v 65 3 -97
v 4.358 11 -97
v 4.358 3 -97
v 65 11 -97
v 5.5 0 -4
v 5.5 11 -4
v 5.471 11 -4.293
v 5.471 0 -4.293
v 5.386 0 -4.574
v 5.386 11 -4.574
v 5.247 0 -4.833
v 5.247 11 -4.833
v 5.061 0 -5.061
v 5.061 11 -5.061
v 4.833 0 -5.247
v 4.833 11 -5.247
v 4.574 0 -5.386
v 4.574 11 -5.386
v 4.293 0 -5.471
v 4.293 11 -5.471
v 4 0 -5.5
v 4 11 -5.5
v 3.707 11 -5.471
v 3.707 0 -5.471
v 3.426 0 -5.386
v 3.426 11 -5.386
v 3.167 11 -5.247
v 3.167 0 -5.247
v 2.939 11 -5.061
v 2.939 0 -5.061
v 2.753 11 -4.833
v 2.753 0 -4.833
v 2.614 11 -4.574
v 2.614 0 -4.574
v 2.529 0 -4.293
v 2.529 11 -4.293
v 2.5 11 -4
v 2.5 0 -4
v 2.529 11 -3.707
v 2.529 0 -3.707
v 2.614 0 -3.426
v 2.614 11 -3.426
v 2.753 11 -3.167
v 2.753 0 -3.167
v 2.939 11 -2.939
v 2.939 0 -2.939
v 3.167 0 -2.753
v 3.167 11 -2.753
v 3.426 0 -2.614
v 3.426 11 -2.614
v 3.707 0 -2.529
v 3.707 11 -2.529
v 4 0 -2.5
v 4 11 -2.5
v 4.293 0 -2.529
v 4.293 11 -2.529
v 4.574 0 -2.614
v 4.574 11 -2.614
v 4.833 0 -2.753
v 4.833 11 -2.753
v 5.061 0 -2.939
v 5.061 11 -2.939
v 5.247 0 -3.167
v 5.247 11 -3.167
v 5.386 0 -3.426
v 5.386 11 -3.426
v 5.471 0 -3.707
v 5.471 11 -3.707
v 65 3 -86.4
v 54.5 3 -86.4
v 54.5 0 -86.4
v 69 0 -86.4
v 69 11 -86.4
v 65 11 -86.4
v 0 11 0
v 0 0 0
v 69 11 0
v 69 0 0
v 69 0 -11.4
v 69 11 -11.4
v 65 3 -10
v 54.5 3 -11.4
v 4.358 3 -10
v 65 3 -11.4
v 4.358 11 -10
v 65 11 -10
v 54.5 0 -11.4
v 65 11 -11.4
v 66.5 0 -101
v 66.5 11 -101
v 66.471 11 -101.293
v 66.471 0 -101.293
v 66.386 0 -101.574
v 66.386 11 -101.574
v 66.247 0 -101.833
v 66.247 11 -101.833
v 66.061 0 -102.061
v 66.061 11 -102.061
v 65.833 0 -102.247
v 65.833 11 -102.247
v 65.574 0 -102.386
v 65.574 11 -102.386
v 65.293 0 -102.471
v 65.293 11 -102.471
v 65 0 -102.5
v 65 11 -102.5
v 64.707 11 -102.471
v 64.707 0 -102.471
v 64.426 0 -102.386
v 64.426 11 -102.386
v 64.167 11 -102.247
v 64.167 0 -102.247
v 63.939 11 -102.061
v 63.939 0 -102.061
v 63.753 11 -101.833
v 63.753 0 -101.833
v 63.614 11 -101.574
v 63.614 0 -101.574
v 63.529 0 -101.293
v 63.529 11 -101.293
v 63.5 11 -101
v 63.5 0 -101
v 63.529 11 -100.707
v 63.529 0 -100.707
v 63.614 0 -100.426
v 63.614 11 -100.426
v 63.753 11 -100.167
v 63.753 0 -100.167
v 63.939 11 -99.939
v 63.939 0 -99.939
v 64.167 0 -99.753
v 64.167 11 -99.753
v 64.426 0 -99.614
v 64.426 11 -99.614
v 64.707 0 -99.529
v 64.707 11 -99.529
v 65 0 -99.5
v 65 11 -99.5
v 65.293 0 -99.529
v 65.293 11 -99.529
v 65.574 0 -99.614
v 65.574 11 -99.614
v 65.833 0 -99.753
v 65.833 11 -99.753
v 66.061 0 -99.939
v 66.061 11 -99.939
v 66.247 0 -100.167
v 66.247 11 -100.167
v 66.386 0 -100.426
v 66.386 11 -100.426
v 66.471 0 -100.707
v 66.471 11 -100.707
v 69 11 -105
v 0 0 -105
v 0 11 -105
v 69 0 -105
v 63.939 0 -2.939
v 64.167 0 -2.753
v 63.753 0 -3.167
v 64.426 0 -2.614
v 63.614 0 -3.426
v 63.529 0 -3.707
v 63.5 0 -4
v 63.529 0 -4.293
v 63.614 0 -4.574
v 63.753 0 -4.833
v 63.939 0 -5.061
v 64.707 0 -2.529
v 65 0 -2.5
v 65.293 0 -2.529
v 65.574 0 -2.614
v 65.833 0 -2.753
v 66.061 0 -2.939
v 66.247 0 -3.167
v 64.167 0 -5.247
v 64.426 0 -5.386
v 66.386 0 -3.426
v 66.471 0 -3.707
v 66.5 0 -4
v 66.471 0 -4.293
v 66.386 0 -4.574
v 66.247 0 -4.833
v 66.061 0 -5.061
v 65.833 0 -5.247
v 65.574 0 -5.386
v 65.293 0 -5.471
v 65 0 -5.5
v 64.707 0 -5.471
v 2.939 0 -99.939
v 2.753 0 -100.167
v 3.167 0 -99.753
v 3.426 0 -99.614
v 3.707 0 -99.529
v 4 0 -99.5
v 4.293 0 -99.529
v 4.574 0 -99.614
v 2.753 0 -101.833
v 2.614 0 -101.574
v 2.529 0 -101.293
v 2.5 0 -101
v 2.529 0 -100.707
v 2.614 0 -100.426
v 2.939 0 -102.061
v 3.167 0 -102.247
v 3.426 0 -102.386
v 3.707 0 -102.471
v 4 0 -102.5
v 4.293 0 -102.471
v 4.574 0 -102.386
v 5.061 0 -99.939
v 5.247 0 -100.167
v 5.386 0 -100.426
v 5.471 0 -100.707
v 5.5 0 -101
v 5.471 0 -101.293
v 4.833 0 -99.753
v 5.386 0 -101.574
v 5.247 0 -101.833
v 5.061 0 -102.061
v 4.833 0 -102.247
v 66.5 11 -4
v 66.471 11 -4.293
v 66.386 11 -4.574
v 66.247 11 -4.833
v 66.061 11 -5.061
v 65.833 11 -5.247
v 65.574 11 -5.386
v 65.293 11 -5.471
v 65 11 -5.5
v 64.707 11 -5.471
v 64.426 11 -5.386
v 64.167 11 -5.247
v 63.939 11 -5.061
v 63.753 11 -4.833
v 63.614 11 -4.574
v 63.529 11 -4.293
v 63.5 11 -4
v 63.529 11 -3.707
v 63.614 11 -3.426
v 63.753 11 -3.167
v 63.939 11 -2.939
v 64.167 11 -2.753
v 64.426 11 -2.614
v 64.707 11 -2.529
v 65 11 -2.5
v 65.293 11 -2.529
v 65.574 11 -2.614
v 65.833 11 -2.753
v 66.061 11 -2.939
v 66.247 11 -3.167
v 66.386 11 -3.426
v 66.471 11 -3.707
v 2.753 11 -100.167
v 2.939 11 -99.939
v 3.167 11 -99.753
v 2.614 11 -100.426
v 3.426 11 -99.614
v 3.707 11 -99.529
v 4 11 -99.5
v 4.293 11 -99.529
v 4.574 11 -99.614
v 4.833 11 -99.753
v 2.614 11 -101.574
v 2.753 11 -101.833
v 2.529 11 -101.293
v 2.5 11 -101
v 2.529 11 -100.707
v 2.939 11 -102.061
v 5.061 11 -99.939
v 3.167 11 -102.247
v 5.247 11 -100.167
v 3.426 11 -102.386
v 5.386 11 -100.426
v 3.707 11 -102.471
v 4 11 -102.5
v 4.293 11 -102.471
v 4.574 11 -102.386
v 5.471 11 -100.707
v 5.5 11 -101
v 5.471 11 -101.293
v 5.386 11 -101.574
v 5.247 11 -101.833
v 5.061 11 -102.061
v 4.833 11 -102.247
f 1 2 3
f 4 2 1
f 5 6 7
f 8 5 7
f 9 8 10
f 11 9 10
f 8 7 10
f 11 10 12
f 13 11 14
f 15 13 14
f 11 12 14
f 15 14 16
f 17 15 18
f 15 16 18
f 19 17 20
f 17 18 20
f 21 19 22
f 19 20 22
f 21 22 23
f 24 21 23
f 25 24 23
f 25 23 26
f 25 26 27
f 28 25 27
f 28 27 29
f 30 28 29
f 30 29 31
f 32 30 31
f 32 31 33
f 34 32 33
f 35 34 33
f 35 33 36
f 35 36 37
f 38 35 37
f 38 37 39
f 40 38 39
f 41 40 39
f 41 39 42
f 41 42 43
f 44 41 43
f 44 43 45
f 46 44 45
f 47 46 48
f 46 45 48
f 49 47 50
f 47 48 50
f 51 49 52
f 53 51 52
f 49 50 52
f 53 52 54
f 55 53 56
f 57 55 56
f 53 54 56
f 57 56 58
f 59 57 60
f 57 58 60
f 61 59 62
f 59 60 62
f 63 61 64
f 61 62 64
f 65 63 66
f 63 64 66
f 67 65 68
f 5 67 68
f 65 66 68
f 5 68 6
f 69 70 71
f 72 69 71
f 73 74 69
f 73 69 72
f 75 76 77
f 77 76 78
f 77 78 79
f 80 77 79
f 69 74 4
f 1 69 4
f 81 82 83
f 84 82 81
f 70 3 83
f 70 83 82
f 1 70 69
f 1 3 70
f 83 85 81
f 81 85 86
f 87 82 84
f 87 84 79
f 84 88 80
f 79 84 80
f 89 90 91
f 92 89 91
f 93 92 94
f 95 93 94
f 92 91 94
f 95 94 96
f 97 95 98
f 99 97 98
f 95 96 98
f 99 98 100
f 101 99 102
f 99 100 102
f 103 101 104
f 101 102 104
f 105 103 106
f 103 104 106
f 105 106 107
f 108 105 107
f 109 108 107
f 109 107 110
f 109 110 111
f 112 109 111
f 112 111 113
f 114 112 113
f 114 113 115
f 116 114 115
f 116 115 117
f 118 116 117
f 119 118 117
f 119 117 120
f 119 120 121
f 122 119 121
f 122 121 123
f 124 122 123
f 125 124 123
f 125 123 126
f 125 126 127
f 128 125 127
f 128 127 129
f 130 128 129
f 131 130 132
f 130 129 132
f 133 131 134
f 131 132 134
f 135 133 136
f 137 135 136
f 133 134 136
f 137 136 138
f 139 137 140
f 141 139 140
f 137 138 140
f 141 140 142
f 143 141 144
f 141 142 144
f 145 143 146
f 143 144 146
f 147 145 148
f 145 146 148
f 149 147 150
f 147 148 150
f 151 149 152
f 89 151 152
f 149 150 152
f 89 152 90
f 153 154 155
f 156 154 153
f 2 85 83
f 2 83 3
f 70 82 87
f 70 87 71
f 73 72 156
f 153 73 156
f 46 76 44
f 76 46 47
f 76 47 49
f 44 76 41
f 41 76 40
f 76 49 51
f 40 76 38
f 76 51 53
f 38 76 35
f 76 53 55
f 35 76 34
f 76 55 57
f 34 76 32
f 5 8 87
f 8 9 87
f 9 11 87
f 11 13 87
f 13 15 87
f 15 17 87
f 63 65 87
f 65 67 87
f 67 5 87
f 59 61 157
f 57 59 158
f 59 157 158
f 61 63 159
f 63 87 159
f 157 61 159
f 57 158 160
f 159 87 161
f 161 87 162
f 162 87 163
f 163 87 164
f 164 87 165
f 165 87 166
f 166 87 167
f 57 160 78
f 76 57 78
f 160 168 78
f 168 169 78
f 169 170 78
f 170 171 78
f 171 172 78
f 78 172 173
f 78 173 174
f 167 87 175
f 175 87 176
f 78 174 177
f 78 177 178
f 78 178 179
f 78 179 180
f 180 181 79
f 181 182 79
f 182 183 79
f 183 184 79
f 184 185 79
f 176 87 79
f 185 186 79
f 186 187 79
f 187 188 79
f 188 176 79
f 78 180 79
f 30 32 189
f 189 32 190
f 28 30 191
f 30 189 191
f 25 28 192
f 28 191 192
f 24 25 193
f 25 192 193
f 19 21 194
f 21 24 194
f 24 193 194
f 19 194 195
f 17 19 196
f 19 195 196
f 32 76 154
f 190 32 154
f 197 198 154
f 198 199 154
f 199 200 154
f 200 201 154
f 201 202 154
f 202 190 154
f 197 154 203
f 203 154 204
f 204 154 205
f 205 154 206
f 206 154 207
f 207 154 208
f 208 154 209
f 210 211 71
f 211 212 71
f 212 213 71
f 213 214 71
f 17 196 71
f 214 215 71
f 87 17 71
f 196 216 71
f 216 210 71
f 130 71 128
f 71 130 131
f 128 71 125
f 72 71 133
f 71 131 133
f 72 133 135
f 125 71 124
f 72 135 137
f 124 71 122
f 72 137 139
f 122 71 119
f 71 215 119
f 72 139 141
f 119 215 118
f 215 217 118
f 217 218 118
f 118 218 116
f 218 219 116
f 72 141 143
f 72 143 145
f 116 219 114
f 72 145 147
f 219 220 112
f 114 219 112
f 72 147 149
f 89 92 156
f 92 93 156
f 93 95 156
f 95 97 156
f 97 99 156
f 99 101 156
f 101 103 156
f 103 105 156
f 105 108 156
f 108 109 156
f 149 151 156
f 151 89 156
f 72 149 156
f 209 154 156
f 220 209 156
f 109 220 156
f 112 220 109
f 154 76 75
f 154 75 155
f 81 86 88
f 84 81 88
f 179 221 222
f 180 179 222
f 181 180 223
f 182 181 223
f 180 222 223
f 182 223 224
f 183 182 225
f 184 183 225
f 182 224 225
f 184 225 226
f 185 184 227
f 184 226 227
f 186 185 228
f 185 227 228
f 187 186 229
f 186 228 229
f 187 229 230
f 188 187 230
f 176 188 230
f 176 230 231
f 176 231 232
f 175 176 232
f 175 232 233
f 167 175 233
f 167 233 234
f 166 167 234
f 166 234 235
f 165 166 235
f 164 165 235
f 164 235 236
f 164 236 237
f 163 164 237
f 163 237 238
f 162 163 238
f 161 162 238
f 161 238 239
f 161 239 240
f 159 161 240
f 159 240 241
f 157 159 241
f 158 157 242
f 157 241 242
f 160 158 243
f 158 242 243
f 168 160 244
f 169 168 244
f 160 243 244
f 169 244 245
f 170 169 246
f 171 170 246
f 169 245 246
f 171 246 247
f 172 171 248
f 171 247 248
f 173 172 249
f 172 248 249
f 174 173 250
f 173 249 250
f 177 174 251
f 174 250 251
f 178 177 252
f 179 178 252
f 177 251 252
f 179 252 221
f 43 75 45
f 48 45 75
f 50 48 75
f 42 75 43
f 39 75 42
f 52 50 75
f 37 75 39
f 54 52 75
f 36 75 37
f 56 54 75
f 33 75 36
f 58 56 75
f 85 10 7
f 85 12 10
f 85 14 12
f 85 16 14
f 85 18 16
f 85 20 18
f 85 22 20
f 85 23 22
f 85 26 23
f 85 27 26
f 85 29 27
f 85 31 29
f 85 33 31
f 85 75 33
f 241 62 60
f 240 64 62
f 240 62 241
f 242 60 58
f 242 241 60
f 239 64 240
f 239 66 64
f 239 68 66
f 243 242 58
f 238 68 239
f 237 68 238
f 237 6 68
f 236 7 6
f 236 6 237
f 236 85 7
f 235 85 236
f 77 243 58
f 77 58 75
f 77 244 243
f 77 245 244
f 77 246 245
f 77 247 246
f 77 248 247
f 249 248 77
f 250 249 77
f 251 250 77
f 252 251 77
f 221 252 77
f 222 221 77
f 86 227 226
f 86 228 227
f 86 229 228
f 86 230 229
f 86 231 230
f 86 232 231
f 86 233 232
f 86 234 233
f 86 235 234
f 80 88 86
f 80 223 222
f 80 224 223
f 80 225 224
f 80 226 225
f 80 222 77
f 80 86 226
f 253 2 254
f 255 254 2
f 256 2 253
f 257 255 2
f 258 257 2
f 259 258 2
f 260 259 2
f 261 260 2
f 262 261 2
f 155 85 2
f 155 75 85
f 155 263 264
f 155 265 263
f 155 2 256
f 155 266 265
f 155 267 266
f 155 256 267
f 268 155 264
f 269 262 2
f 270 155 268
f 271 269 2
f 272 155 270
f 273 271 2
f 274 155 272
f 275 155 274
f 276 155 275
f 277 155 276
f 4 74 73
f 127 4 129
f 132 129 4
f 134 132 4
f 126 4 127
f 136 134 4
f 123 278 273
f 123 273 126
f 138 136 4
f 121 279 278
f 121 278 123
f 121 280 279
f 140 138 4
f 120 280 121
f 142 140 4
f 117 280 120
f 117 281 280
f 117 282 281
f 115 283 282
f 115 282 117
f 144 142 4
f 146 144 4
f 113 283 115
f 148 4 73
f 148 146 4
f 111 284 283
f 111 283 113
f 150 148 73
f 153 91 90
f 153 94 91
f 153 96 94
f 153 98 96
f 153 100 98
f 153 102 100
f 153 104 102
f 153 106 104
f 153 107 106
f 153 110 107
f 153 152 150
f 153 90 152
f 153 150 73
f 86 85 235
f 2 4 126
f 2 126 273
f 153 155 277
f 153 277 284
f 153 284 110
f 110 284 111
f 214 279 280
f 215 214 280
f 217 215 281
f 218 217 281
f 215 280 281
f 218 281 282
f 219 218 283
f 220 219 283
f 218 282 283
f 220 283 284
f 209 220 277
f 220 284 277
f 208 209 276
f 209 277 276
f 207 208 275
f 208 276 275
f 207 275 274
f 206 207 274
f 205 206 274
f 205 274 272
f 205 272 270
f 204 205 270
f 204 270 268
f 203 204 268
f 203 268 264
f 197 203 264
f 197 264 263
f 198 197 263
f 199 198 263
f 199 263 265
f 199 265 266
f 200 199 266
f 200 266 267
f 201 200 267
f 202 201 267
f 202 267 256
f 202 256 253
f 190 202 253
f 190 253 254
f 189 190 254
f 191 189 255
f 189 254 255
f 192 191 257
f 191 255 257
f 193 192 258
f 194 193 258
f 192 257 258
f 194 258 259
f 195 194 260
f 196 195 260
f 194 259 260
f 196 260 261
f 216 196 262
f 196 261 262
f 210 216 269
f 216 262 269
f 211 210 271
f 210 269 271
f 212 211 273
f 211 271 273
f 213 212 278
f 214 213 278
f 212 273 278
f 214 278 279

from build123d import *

# Parameters (mm, degrees)
SKETCH1_W           = 69
SKETCH1_H           = 105
BOSS_EXTRUDE2_DEPTH = 11
SKETCH3_W           = 60.642005931
SKETCH3_H           = 87
CUT_EXTRUDE1_DEPTH  = 8
SKETCH4_R           = 1.5
CUT_EXTRUDE2_DEPTH  = 12
SKETCH5_W           = 14.5
SKETCH5_H           = 75
CUT_EXTRUDE3_DEPTH  = 12


with BuildPart() as part:
    # Sketch1 → Boss-Extrude2 (new body)
    with BuildSketch(Plane(origin=(0, 0, 0), x_dir=(1, 0, 0), z_dir=(0, 1, 0))):
        with Locations((34.5, 52.5)):
            Rectangle(SKETCH1_W, SKETCH1_H)
    extrude(amount=BOSS_EXTRUDE2_DEPTH)

    # Sketch3 → Cut-Extrude1 (cut)
    with BuildSketch(Plane(origin=(0, 11, 0), x_dir=(1, 0, 0), z_dir=(0, 1, 0))):
        with Locations((34.678997035, 53.5)):
            Rectangle(SKETCH3_W, SKETCH3_H)
    extrude(amount=-CUT_EXTRUDE1_DEPTH, mode=Mode.SUBTRACT)

    # Sketch4 → Cut-Extrude2 (cut, through all)
    with BuildSketch(Plane(origin=(0, 11, 0), x_dir=(1, 0, 0), z_dir=(0, 1, 0))):
        with Locations((4, 101)):
            Circle(SKETCH4_R)
        with Locations((65, 101)):
            Circle(SKETCH4_R)
        with Locations((4, 4)):
            Circle(SKETCH4_R)
        with Locations((65, 4)):
            Circle(SKETCH4_R)
    extrude(amount=-CUT_EXTRUDE2_DEPTH, mode=Mode.SUBTRACT)

    # Sketch5 → Cut-Extrude3 (cut, through all)
    with BuildSketch(Plane(origin=(0, 11, 0), x_dir=(1, 0, 0), z_dir=(0, 1, 0))):
        with Locations((61.75, 48.9)):
            Rectangle(SKETCH5_W, SKETCH5_H)
    extrude(amount=-CUT_EXTRUDE3_DEPTH, mode=Mode.SUBTRACT)


solid = part.part
